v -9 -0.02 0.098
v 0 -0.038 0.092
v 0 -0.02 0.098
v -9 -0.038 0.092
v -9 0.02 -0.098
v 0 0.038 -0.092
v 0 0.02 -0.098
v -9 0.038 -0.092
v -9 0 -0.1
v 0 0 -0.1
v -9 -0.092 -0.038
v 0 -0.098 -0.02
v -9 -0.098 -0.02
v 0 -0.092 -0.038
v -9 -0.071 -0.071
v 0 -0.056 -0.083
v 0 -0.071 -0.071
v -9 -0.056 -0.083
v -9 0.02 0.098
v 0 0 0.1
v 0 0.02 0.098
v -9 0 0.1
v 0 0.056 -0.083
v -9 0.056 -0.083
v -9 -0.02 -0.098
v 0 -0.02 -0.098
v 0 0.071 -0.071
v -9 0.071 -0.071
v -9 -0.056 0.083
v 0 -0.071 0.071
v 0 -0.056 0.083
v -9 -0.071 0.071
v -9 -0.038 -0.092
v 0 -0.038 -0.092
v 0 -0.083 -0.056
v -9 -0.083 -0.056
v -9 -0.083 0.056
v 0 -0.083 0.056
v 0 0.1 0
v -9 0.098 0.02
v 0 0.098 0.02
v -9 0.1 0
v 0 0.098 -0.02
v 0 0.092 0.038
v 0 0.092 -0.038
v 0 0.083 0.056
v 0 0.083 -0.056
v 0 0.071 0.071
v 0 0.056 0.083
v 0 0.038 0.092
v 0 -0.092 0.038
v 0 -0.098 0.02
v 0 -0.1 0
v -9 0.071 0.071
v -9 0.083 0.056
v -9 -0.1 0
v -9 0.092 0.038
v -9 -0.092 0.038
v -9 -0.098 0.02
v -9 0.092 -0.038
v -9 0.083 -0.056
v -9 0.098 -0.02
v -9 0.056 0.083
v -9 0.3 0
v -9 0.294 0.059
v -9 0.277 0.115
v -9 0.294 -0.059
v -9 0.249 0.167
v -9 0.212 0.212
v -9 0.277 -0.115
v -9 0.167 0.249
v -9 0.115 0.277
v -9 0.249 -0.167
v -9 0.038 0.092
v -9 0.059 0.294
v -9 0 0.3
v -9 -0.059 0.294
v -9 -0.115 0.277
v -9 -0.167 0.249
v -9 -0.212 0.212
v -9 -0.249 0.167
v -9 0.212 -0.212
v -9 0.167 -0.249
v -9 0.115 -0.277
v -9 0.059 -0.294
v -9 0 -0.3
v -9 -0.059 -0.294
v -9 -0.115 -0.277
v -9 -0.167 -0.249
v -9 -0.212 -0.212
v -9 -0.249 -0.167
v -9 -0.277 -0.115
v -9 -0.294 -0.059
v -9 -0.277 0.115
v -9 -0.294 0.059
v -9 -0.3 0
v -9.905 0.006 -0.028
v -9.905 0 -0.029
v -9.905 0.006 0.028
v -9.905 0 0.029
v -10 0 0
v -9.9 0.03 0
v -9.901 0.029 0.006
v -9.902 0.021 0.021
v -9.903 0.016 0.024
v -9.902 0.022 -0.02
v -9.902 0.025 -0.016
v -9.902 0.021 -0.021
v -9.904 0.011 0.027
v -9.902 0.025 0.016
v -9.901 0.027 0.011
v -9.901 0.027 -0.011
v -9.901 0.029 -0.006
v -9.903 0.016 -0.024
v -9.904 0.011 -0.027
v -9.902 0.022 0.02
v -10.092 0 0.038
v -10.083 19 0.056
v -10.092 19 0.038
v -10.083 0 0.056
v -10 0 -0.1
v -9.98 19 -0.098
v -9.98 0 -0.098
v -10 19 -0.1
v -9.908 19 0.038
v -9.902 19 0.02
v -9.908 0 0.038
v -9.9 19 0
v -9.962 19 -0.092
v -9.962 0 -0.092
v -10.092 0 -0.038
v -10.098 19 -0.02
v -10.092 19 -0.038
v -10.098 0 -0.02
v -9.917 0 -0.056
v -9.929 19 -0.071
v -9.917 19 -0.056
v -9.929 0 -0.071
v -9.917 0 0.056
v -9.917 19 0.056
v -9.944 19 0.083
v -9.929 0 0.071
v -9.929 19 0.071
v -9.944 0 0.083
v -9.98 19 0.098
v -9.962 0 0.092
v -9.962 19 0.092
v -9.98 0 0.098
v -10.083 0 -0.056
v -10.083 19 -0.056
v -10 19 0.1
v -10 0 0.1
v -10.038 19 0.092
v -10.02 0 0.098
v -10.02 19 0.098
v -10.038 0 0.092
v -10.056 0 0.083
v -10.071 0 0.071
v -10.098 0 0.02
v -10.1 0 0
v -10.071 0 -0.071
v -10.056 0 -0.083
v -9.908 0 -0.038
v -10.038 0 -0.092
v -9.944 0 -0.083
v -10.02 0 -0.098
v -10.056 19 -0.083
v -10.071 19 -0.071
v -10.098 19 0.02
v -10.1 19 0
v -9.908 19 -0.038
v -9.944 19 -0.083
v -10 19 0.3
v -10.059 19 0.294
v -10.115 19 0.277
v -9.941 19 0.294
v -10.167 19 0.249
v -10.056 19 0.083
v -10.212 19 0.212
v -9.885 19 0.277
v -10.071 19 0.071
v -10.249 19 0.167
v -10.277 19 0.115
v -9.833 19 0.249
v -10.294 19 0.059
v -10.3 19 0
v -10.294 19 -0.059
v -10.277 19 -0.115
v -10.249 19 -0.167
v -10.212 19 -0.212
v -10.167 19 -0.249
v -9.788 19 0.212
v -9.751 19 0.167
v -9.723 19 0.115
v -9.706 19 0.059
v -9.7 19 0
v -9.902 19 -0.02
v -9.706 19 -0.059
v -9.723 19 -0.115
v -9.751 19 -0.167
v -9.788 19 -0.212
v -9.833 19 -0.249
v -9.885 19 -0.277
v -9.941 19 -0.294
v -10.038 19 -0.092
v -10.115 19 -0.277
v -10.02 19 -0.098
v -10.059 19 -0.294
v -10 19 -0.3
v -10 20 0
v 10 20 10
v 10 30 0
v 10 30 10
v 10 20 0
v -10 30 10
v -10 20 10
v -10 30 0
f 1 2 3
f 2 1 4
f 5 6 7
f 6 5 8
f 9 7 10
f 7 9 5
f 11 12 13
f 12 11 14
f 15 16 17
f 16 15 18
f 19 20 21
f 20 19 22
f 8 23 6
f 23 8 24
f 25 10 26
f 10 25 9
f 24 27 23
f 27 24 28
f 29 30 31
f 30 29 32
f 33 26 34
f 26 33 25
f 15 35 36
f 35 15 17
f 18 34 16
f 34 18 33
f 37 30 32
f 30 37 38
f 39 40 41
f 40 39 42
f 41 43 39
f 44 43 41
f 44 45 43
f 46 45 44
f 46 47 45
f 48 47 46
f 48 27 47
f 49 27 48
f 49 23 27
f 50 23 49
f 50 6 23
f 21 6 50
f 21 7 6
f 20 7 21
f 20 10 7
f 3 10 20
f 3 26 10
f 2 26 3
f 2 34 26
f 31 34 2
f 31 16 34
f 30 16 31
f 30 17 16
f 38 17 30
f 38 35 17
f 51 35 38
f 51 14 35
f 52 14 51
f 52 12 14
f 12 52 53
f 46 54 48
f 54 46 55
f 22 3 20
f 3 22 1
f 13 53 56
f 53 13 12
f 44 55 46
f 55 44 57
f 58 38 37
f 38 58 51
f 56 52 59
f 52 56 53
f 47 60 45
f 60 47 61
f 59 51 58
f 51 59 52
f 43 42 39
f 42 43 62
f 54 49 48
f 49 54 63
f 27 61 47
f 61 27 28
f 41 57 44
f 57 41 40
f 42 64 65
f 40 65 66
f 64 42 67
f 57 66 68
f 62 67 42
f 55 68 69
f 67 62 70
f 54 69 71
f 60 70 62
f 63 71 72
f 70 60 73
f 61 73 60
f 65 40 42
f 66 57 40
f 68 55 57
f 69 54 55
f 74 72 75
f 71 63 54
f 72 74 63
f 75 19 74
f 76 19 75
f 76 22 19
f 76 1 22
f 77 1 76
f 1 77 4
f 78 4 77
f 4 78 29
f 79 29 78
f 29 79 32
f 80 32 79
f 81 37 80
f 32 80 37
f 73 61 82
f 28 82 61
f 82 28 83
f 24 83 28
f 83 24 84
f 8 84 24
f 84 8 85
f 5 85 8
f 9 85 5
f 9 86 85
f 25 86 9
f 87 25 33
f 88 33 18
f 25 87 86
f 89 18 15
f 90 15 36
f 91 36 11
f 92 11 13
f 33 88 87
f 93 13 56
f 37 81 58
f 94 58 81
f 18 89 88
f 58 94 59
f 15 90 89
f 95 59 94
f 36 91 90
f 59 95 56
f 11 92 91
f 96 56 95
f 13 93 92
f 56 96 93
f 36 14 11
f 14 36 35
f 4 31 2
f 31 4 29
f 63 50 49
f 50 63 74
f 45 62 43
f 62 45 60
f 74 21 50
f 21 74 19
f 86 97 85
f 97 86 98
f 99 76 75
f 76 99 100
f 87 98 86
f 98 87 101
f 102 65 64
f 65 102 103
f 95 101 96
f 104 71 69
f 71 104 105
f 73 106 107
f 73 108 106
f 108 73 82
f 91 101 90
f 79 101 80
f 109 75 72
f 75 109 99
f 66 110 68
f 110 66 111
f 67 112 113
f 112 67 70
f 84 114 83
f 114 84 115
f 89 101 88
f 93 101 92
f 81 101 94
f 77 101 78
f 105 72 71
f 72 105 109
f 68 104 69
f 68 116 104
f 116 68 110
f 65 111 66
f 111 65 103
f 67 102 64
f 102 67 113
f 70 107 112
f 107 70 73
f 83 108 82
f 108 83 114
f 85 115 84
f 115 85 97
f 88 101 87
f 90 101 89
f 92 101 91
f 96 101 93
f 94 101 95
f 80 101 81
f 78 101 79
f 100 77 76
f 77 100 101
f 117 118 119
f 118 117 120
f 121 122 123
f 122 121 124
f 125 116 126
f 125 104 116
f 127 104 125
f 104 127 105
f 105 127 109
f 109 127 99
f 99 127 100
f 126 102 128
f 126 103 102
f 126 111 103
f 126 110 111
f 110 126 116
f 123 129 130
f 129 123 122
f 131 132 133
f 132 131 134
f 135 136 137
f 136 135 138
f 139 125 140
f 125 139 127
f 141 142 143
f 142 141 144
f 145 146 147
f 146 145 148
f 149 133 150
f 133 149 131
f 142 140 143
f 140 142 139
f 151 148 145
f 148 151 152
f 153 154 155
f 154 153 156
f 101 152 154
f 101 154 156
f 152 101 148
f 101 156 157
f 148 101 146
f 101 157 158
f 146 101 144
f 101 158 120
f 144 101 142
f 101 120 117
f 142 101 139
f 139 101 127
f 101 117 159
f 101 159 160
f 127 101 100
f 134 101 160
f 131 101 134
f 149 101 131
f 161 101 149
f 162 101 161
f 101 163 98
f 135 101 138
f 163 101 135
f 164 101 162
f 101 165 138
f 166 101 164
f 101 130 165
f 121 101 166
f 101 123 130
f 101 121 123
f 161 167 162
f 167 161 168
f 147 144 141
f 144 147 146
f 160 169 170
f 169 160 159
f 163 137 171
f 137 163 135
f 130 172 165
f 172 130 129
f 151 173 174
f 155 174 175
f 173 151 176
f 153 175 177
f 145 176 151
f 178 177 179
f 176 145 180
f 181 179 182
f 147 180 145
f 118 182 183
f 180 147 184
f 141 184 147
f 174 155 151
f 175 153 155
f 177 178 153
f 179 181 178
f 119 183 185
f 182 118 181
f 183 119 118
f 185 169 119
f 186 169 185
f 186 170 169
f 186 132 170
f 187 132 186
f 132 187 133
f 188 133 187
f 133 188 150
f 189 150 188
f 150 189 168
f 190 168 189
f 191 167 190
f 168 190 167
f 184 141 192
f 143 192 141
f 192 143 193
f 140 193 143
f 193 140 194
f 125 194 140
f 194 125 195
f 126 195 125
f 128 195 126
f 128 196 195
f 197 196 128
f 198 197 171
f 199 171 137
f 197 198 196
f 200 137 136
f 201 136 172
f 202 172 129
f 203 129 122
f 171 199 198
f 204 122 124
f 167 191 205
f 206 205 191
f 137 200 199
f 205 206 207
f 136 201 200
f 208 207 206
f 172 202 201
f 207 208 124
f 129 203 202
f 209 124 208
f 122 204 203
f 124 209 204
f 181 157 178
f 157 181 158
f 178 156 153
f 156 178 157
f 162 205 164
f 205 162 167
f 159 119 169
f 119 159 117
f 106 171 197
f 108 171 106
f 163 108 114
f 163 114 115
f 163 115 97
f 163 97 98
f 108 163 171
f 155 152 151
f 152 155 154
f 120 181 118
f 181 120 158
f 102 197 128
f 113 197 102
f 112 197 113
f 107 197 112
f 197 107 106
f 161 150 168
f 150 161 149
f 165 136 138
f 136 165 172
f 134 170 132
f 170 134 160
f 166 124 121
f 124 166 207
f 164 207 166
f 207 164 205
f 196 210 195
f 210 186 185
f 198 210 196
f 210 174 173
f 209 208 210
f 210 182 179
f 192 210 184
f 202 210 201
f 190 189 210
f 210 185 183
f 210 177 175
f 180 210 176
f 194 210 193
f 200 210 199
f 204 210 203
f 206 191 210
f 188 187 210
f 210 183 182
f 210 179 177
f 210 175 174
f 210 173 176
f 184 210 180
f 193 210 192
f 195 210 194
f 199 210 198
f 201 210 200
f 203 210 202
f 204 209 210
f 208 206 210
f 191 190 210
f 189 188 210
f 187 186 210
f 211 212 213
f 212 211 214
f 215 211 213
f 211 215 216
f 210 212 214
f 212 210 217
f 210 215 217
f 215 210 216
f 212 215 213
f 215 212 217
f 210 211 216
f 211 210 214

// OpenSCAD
%cube([20, 10, 10]); 
translate([-10, 20, 0]) cube([20, 10, 10]); 
$fn=32;
color("Red") translate([-10, 0, 0]) rotate([0,90,0]) {
    translate([0,0,1]) cylinder(h=9, r=0.1);
    cylinder(h=1, r1=0, r2=0.3);
}
color("Green") translate([-10, 20, 0]) rotate([90,0,0]) {
    translate([0,0,1]) cylinder(h=19, r=0.1);
    cylinder(h=1, r1=0, r2=0.3);
}
